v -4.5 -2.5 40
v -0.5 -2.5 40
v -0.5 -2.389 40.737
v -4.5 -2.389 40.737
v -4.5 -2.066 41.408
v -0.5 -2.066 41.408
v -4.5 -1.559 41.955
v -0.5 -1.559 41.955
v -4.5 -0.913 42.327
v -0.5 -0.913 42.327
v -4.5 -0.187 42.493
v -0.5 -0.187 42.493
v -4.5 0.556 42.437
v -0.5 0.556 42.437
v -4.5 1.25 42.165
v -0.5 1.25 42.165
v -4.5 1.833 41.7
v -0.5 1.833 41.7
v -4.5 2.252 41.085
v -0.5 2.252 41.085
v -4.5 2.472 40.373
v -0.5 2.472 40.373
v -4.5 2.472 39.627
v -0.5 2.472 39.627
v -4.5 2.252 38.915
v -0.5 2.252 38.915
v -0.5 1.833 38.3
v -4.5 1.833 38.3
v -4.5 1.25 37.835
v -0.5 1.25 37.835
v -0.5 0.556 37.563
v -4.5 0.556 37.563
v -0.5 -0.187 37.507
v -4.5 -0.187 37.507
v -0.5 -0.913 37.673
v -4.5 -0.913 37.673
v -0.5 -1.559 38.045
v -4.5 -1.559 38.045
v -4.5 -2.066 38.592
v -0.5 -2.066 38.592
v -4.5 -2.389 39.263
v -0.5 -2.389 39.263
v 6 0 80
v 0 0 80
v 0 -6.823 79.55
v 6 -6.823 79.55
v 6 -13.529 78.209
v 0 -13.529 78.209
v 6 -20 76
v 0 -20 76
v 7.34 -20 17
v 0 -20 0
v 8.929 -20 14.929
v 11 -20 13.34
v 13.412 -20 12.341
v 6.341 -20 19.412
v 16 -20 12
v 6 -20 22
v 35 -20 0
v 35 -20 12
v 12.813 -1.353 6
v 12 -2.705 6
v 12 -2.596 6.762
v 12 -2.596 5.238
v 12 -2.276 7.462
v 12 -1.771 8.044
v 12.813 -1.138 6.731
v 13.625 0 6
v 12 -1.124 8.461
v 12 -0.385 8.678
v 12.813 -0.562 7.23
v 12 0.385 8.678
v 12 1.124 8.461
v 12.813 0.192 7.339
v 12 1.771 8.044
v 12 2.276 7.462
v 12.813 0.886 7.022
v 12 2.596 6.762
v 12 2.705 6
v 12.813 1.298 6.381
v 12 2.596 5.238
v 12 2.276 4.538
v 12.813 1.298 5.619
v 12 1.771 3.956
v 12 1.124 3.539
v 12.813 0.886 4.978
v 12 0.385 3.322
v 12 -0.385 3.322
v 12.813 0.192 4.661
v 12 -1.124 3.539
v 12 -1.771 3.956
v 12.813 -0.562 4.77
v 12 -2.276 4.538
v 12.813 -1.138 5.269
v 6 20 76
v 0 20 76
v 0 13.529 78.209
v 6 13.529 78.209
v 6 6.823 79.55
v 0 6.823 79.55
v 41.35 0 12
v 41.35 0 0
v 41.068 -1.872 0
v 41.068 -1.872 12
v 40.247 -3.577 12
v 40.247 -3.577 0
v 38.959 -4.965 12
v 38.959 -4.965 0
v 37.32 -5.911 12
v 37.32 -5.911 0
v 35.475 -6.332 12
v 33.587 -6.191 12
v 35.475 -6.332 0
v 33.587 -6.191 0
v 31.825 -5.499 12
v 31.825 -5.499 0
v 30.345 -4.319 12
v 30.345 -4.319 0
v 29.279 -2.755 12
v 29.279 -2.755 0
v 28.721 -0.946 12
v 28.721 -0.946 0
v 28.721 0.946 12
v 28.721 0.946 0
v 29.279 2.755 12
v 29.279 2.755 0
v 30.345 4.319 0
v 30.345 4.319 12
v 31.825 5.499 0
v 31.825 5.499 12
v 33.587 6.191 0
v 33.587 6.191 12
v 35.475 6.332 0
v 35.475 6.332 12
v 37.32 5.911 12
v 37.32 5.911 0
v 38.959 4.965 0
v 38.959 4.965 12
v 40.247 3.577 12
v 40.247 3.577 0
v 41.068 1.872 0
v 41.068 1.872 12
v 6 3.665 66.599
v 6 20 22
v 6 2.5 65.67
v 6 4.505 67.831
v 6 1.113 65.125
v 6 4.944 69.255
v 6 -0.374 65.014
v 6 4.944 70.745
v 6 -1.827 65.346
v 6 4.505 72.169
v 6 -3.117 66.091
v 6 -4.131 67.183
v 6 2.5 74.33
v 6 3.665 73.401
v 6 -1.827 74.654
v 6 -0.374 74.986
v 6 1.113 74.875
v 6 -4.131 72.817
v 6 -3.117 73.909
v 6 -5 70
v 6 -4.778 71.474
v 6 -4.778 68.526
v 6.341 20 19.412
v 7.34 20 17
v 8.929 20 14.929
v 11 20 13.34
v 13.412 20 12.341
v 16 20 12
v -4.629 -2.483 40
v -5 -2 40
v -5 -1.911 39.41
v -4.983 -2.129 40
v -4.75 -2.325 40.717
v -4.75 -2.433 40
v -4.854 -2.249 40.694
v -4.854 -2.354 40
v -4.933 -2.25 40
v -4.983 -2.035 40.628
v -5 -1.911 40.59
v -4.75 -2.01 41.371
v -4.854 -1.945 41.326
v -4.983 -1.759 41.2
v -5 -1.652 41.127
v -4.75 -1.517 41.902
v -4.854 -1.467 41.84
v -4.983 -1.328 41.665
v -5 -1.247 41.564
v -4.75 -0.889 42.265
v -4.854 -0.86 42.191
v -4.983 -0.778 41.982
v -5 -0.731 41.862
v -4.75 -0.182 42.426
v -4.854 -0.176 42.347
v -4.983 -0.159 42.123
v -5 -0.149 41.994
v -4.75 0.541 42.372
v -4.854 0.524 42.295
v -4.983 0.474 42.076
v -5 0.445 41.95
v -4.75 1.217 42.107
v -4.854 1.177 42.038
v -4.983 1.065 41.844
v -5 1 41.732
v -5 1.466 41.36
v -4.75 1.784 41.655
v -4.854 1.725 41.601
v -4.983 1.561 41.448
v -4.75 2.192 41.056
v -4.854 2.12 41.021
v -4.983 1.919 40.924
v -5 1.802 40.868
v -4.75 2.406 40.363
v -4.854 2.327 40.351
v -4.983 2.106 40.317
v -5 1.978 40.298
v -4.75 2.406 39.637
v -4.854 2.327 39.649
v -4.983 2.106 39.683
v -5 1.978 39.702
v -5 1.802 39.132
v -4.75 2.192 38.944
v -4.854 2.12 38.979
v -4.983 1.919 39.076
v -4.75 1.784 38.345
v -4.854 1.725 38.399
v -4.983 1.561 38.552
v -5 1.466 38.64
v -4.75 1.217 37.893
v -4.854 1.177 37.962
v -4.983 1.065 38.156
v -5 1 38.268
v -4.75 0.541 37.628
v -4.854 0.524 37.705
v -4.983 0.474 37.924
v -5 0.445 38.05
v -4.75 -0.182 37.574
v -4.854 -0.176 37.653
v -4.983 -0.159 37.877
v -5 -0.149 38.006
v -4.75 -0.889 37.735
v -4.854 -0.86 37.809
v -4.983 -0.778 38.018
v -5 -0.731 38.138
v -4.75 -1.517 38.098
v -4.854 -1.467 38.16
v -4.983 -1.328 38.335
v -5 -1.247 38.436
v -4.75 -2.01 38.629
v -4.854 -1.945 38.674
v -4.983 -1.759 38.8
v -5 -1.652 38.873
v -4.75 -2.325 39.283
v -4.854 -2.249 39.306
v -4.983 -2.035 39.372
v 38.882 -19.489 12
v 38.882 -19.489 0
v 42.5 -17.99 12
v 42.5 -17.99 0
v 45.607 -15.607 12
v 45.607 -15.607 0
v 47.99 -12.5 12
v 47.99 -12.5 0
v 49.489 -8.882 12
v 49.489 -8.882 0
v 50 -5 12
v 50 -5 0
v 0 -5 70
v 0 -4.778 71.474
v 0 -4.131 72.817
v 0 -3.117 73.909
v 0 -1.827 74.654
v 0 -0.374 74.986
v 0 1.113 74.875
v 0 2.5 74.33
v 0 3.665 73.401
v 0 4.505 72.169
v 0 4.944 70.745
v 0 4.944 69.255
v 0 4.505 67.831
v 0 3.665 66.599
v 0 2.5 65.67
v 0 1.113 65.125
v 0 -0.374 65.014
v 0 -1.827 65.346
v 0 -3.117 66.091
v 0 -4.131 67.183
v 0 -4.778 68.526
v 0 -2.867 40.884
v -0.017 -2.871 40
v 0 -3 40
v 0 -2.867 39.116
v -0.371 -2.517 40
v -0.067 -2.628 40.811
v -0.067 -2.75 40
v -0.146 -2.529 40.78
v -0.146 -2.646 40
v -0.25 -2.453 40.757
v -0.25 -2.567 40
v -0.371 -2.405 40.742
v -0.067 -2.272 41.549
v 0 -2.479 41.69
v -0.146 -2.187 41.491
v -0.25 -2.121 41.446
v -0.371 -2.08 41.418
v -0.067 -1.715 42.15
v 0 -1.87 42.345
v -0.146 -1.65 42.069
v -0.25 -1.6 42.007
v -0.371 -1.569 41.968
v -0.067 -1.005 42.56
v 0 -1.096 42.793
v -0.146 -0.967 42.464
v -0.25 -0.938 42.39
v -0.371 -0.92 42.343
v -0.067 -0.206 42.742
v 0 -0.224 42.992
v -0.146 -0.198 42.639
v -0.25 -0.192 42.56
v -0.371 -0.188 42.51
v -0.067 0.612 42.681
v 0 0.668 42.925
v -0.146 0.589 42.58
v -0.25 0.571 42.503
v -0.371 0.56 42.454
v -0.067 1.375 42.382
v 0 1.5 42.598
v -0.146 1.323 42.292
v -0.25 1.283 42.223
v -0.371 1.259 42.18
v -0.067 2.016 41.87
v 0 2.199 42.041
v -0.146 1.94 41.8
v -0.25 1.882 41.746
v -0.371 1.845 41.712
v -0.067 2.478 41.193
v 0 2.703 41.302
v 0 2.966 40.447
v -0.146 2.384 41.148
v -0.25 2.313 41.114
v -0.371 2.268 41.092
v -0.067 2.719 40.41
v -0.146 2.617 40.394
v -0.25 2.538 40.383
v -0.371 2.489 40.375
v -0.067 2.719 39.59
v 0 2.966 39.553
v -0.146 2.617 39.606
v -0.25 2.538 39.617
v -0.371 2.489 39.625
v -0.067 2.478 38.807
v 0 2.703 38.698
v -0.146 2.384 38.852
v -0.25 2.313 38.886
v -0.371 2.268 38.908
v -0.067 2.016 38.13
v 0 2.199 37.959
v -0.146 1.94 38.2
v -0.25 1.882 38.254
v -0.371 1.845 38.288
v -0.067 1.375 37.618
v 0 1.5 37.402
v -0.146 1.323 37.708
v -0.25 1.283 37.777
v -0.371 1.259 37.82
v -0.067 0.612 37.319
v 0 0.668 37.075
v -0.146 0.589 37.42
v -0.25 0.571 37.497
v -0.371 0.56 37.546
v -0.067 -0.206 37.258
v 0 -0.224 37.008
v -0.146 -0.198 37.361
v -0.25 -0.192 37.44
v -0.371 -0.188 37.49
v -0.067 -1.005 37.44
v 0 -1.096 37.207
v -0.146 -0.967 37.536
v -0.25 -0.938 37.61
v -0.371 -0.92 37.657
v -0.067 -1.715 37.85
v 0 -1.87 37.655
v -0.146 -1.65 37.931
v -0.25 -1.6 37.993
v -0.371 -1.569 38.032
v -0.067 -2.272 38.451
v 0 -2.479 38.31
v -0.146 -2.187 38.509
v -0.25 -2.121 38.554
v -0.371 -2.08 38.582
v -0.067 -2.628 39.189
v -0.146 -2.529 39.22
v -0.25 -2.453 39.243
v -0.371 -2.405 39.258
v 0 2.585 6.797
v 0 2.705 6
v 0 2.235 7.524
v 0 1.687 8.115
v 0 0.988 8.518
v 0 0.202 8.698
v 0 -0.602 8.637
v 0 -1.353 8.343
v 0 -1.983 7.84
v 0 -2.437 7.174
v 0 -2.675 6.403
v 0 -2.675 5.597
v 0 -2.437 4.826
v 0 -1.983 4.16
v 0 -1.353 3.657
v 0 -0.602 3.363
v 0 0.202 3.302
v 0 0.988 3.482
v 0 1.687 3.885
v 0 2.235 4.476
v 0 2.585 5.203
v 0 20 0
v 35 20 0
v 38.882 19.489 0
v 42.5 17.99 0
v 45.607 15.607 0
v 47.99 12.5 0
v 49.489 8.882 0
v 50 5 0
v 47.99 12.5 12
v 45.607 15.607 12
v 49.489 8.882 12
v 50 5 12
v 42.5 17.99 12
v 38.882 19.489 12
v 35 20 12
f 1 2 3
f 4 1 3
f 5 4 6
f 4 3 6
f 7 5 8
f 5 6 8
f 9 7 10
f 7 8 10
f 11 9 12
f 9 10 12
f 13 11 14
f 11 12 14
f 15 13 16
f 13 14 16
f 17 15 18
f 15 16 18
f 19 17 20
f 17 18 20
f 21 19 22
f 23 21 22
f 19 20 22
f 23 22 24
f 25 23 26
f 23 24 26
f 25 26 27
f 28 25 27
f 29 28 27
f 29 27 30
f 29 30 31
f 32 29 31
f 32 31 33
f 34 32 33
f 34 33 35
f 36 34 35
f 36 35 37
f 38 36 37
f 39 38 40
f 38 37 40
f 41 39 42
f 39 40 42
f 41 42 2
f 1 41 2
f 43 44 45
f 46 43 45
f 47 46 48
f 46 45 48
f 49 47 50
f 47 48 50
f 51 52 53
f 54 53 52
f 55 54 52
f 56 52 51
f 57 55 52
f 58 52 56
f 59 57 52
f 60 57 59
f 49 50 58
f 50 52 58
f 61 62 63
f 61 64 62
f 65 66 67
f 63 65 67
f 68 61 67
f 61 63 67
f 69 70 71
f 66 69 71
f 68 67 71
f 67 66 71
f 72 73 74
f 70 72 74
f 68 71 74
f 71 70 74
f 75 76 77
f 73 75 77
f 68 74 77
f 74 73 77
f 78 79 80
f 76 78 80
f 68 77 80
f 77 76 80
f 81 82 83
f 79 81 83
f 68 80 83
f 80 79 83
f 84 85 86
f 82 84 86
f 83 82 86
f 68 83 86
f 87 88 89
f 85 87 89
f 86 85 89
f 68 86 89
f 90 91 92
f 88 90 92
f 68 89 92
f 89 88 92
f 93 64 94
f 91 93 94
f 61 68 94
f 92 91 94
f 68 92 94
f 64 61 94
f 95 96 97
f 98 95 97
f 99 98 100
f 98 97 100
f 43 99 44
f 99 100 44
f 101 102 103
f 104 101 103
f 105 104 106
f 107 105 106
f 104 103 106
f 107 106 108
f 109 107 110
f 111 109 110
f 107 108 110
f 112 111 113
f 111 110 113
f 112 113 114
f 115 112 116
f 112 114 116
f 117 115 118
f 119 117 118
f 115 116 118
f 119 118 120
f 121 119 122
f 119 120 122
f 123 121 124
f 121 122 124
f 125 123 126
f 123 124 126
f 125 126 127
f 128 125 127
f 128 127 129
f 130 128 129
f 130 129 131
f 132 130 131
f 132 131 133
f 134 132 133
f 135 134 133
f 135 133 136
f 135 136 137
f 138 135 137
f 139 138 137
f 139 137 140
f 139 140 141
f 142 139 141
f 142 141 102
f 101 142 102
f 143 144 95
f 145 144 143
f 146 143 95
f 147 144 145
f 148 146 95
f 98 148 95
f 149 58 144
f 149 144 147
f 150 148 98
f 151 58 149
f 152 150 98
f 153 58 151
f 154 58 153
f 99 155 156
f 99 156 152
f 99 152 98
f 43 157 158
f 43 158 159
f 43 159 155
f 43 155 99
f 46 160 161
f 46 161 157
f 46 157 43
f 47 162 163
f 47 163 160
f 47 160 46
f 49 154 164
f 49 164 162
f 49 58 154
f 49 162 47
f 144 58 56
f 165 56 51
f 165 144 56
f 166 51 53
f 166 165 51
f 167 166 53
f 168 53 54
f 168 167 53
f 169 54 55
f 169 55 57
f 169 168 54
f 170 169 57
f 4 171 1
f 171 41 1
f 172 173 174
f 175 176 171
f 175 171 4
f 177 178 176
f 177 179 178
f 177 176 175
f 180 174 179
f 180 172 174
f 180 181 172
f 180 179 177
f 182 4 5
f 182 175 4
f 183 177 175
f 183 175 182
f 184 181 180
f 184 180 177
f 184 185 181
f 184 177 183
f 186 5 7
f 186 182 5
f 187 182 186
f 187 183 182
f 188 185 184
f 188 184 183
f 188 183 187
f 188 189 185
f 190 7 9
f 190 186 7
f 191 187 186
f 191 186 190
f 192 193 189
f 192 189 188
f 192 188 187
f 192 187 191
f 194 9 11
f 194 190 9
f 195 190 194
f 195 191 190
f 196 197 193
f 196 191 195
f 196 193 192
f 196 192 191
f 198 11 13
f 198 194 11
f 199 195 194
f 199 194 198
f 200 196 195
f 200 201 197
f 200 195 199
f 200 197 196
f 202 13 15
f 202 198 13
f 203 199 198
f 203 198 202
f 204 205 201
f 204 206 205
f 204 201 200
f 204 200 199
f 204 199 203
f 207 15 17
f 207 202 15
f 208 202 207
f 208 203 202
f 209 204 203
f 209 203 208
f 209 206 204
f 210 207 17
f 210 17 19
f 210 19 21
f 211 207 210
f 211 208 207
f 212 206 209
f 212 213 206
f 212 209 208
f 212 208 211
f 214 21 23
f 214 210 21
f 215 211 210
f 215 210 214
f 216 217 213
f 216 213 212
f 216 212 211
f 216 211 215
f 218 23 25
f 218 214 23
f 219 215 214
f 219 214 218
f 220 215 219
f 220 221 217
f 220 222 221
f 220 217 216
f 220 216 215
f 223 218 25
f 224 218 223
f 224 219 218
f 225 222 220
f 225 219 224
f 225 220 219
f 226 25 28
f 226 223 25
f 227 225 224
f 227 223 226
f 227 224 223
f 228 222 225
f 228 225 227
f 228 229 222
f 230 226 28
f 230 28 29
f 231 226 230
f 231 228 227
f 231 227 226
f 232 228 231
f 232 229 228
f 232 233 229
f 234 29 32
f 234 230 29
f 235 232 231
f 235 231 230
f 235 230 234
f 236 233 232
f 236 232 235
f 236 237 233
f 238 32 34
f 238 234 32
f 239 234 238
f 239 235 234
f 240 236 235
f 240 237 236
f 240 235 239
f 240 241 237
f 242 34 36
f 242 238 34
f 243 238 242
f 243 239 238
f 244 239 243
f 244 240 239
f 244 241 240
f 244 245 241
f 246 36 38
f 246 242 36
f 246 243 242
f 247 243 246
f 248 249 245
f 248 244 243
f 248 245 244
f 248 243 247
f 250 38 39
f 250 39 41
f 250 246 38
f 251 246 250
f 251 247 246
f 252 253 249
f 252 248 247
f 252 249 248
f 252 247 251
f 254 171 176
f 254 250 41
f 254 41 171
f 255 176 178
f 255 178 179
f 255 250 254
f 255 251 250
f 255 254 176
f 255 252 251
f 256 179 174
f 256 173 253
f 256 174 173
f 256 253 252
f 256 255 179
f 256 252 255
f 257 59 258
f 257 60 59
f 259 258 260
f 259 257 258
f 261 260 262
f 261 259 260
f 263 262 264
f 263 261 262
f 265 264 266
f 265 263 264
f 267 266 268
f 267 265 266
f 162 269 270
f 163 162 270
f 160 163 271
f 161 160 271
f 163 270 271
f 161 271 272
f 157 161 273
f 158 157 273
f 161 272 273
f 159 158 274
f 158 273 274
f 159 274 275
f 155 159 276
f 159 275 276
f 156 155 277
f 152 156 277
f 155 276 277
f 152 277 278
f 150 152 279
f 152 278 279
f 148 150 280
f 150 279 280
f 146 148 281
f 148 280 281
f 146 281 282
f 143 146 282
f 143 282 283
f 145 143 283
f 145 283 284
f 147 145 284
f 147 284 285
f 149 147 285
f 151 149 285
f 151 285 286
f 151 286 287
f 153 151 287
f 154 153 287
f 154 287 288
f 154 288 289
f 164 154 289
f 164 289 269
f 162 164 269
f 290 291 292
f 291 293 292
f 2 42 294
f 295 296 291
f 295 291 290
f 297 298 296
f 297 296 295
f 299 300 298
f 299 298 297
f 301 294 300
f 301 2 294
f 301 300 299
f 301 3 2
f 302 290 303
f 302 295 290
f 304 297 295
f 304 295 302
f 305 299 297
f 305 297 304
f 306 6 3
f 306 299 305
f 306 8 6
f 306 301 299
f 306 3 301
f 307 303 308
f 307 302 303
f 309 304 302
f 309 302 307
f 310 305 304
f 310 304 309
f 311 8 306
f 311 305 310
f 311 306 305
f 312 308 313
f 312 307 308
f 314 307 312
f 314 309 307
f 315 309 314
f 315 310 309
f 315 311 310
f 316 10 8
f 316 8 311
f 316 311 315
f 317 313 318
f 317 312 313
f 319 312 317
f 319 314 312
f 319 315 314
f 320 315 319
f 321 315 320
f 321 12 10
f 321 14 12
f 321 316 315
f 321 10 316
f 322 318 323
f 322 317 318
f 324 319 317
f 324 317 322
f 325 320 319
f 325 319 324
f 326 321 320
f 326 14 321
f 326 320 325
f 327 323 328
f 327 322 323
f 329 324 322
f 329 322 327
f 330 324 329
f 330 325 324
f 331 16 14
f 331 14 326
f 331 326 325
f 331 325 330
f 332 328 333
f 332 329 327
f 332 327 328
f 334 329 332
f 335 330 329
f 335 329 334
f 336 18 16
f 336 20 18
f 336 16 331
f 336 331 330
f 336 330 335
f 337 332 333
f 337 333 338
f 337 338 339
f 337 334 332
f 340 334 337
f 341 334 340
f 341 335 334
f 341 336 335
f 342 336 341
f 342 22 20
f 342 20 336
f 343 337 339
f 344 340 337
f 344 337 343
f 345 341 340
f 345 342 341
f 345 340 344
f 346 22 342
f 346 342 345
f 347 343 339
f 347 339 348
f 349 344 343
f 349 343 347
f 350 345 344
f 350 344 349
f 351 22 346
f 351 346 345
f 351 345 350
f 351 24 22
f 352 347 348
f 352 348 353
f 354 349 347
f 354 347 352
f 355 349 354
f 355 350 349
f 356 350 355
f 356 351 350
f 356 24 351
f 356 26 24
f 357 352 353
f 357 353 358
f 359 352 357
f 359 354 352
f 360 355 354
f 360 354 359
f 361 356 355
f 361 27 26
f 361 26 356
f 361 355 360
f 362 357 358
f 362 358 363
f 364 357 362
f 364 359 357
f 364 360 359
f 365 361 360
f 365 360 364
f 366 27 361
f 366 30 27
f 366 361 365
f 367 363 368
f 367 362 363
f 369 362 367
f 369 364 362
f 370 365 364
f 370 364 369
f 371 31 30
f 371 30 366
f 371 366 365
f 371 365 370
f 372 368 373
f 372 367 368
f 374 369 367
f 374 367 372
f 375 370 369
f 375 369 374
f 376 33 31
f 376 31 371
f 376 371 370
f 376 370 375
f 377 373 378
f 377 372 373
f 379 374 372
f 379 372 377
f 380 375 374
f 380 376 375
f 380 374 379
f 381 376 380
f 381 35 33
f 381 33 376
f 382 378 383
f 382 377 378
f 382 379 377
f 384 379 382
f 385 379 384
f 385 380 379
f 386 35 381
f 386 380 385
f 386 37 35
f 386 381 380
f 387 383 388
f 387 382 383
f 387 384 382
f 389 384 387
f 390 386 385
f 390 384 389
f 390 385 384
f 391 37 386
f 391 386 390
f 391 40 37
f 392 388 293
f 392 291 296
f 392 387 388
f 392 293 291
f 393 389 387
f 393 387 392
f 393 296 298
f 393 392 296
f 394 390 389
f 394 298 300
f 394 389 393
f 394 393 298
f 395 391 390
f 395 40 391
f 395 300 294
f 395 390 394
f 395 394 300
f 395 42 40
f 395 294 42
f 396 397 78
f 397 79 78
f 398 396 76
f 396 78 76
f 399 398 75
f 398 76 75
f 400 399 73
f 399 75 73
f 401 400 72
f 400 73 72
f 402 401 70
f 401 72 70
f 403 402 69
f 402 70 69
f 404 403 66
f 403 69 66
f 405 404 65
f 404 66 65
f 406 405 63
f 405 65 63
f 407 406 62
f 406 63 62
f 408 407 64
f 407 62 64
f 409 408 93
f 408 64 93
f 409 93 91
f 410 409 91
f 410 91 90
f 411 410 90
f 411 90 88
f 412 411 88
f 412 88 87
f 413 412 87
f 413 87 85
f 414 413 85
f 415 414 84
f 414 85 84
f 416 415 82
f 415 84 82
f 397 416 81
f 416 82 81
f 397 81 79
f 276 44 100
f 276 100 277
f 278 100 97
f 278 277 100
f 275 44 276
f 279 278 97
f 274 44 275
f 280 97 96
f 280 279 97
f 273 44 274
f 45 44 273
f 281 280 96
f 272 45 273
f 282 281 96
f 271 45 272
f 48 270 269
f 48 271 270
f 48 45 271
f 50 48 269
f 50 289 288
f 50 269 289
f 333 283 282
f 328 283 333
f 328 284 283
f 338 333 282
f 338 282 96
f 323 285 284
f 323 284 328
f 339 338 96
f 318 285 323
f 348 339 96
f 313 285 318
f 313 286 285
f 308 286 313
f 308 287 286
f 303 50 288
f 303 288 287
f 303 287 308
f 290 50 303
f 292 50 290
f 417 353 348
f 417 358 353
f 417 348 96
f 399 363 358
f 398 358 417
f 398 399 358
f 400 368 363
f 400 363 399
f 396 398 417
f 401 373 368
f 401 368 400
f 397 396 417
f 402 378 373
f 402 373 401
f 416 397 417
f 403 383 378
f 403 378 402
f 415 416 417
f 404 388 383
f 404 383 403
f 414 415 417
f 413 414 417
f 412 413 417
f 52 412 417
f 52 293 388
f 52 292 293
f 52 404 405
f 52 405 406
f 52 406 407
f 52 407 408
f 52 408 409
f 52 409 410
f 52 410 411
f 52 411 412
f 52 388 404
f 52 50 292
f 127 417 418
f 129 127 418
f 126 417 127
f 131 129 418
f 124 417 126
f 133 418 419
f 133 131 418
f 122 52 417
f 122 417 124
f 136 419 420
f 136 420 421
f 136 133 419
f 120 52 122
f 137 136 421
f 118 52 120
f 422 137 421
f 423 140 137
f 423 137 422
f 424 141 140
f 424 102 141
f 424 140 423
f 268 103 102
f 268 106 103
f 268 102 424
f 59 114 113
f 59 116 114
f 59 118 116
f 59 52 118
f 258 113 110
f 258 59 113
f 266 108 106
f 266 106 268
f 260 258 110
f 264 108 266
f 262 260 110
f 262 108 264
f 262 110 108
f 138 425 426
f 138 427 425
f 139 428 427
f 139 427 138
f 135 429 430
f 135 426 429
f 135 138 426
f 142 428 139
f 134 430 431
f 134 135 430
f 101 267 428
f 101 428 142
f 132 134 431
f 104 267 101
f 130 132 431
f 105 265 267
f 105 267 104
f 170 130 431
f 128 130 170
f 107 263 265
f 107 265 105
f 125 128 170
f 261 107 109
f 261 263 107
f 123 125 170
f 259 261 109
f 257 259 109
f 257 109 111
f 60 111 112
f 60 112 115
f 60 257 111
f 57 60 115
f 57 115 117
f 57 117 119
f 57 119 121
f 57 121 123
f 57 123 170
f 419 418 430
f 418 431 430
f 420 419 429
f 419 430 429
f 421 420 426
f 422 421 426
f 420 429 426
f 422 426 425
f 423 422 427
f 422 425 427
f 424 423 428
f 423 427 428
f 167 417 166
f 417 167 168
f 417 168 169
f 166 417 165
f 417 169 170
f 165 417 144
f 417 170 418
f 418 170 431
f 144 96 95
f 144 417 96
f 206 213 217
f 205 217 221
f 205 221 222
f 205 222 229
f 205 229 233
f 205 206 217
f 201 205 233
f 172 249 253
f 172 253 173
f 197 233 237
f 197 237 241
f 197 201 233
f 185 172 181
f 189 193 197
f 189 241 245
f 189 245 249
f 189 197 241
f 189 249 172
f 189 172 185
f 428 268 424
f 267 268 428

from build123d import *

# Parameters (mm, degrees)
F1_DEPTH  = 20
F2_R      = 10
F3_R      = 6.35
F4_DEPTH  = 80.001
F6_D      = 5.4102
F6_DEPTH  = 12
F6_TIP    = 1.6253880605
F7_R      = 5
F8_DEPTH  = 50.001
F9_R      = 2.5
F10_DEPTH = 5
F11_R     = 0.5
F12_R     = 15


with BuildPart() as f1:
    # F0 (on Front) → F1 (new body, symmetric)
    with BuildSketch(Plane.XZ):
        Polygon((0, 80), (0, 0), (50, 0), (50, 12), (6, 12), (6, 80), align=None)
    extrude(amount=F1_DEPTH, both=True)

    # F2
    f2_edges = [f1.edges().sort_by_distance(p)[0] for p in [
        (6, 0, 12),
    ]]
    fillet(f2_edges, radius=F2_R)

    # F3 (on face) → F4 (cut, through all)
    with BuildSketch(Plane(origin=(0, 0, 0), x_dir=(1, 0, 0), z_dir=(0, 0, -1))):
        with Locations((35, 0)):
            Circle(F3_R)
    extrude(amount=-F4_DEPTH, mode=Mode.SUBTRACT)

    # F6
    with Locations(Plane(origin=(0, 0, 0), x_dir=(0, -1, 0), z_dir=(-1, 0, 0))):
        with Locations((0, 6)):
            Hole(F6_D / 2, depth=F6_DEPTH)
            with Locations((0, 0, -(F6_DEPTH + F6_TIP / 2))):  # 118° drill point
                Cone(0, F6_D / 2, F6_TIP, mode=Mode.SUBTRACT)

    # F7 (on face) → F8 (cut, through all)
    with BuildSketch(Plane(origin=(0, 0, 0), x_dir=(0, -1, 0), z_dir=(-1, 0, 0))):
        with BuildLine():
            ThreePointArc((-20, 76), (-10.1980390272, 78.9901951359), (0, 80))
            Line((0, 80), (-20, 80))
            Line((-20, 80), (-20, 76))
        make_face()
        with BuildLine():
            ThreePointArc((0, 80), (10.1980390272, 78.9901951359), (20, 76))
            Line((20, 76), (20, 80))
            Line((20, 80), (0, 80))
        make_face()
        with Locations((0, 70)):
            Circle(F7_R)
    extrude(amount=-F8_DEPTH, mode=Mode.SUBTRACT)

    # F9 (on face) → F10 (join)
    with BuildSketch(Plane(origin=(0, 0, 0), x_dir=(0, -1, 0), z_dir=(-1, 0, 0))):
        with Locations((0, 40)):
            Circle(F9_R)
    extrude(amount=F10_DEPTH)

    # F11
    f11_edges = [f1.edges().sort_by_distance(p)[0] for p in [
        (0, 2.5, 40),
        (-5, 2.5, 40),
    ]]
    fillet(f11_edges, radius=F11_R)

    # F12
    f12_edges = [f1.edges().sort_by_distance(p)[0] for p in [
        (50, -20, 6),
        (50, 20, 6),
    ]]
    fillet(f12_edges, radius=F12_R)


solid = f1.part
